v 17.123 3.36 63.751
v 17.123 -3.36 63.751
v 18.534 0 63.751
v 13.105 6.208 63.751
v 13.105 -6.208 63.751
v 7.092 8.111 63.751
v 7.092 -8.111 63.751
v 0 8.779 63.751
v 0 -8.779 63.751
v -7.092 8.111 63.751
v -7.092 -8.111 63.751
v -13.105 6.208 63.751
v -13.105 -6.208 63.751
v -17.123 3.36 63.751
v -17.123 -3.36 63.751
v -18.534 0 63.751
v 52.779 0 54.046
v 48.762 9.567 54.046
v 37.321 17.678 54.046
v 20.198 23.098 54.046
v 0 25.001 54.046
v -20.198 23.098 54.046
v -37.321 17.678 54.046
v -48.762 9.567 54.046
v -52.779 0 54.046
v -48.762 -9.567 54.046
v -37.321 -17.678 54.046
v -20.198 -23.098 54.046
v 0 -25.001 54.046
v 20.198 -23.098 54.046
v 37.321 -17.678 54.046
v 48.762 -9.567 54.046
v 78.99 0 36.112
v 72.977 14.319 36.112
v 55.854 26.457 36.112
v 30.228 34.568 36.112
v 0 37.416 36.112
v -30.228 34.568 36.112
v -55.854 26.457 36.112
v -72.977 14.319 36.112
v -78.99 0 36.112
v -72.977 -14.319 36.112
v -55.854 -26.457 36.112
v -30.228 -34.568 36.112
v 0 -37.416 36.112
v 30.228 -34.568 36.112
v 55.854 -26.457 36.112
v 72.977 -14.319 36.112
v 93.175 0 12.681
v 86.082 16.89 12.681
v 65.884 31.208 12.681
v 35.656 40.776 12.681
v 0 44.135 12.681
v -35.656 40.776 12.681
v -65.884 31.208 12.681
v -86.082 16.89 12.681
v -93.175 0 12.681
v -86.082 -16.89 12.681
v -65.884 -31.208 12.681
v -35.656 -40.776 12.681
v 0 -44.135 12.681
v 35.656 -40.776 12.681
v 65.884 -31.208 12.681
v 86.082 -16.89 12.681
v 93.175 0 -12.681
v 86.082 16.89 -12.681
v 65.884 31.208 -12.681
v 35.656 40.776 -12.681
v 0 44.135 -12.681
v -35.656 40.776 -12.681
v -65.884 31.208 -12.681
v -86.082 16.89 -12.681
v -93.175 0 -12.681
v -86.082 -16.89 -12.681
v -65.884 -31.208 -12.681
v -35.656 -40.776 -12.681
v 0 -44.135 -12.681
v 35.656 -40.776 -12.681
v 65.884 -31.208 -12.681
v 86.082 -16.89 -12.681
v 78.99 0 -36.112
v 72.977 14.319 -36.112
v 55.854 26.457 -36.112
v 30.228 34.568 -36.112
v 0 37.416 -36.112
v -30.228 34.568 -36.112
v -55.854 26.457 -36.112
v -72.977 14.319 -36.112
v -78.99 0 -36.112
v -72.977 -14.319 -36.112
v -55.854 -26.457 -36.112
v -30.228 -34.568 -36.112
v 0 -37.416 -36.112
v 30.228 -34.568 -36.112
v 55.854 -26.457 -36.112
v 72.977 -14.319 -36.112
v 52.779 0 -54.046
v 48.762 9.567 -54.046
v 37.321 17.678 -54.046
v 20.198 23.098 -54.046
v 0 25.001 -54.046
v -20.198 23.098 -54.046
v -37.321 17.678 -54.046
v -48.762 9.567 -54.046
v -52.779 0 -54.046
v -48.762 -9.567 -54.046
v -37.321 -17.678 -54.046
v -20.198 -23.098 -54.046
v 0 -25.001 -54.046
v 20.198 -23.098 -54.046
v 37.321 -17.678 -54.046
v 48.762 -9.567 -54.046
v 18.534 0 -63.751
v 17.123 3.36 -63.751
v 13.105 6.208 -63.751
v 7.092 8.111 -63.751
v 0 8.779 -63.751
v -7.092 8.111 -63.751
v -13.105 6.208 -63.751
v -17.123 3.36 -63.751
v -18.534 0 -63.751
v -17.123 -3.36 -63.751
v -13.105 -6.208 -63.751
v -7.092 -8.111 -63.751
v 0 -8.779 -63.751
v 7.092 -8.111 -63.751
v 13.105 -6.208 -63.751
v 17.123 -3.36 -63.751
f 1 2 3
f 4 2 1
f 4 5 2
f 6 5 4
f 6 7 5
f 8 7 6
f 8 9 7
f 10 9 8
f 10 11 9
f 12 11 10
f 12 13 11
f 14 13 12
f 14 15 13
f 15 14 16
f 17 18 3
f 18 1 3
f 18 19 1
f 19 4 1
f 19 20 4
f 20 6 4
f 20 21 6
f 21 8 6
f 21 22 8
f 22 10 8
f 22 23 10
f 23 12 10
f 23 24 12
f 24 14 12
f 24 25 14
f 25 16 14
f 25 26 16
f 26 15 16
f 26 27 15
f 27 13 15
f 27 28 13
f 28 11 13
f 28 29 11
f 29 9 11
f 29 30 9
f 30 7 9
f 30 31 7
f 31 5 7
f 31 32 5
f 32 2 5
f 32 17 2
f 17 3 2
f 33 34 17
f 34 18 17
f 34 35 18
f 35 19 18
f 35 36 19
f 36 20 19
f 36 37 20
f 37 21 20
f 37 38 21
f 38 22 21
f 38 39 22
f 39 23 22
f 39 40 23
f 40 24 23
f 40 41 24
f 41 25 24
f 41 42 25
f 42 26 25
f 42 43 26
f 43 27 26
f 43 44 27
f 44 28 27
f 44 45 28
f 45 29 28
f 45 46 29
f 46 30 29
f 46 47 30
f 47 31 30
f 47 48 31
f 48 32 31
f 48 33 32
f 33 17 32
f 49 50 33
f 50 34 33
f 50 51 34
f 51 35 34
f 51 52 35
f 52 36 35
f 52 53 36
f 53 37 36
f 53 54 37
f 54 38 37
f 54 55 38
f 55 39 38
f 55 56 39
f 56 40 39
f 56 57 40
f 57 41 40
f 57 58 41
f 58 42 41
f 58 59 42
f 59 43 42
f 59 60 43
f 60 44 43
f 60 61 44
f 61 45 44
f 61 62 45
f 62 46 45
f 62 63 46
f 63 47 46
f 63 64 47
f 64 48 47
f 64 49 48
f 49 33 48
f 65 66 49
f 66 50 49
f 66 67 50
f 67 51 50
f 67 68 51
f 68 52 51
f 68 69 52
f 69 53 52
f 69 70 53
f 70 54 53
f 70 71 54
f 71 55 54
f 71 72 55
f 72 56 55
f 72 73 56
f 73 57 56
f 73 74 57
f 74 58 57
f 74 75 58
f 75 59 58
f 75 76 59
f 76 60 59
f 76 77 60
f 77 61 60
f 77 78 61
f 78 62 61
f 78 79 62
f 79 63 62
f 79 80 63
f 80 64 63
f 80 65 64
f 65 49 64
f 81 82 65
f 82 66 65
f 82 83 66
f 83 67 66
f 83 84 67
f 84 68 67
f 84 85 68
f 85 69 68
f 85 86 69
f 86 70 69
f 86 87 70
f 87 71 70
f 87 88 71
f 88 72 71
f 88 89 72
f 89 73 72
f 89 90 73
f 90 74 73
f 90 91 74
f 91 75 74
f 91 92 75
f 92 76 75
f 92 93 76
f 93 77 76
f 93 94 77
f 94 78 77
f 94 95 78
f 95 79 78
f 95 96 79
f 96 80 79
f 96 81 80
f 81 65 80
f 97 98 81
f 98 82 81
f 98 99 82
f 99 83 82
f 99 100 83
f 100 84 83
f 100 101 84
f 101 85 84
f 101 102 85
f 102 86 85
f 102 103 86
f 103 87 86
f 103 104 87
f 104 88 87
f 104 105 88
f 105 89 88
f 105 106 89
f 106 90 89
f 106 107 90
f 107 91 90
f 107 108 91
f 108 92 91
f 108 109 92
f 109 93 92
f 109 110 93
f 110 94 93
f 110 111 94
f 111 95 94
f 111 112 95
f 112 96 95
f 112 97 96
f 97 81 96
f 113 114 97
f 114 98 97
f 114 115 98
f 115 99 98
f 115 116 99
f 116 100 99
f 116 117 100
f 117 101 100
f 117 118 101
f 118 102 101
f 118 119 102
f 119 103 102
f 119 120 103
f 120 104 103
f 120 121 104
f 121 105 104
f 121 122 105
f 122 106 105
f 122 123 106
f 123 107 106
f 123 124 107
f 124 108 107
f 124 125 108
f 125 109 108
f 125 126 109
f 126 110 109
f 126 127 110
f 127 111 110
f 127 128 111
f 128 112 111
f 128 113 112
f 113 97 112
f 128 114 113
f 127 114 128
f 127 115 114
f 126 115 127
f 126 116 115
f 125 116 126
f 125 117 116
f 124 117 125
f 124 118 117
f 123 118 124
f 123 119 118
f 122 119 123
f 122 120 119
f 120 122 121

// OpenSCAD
// Generated by SolidPython 1.0.1 on 2020-07-29 00:46:54


scale(v = [19, 9, 13]) {
	sphere(r = 5);
}
/***********************************************
*********      SolidPython code:      **********
************************************************
 
# import packages: SolidPython
from solid import *
from solid.utils import *
from itertools import chain, combinations, permutations


class Resize:

    def __init__(self, scad_file):
        self.scad_file = scad_file
        #self.scad_file = import_scad(scad_file)
        # cone/cylinder param:
        self.r1 = 0
        self.r2 = 0
        self.h = 0
        # rectangular prism param:
        self.w = 0
        self.l = 0
        # ellipse param:
        self.r = 0

    # import OpenScad code (file name corresponds to shape)


    # classify shape + parameters
    def assign(self, param1, param2, param3):
        if self.scad_file == 'cone.scad':
            self.r1 = param1
            self.r2 = param2
            self.h = param3
        elif self.scad_file == 'cylinder.scad':
            self.r1 = param1
            self.r2 = param2
            self.h = param3
        elif self.scad_file == 'rectangularPrism.scad':
            self.h = param1
            self.l = param2
            self.w = param3
        else:
            self.r = param1
            self.h = param2

    # resize parameters
    def iterate(self):
        x = range(3, 20, 2)
        i = 1
        if self.scad_file == 'cone.scad':
            tempList = list(permutations(x, 2))
            for temp in tempList:
                param1 = temp[0]
                param2 = temp[1]
                filepath = 'produced_scad_files/' + 'cone' + str(param1) + '_' + str(param2) + '_' + '.scad'
                scad_render_to_file(cylinder(h=param1, r1=param2, r2=0), filepath)

        elif self.scad_file == 'cylinder.scad':
            tempList = list(permutations(x, 3))
            for temp in tempList:
                param1 = temp[0]
                param2 = temp[1]
                filepath = 'produced_scad_files/' + 'cylinder' + str(param1) + '_' + str(param2) + '_' + '.scad'
                scad_render_to_file(cylinder(h=param1, r1=param2, r2=param2), filepath)

        elif self.scad_file == 'rectangularPrism.scad':
            tempList = list(permutations(x, 3))
            for temp in tempList:
                param1 = temp[0]
                param2 = temp[1]
                param3 = temp[2]
                filepath = 'produced_scad_files/' + 'rectangularPrism' + str(param1) + '_' + str(param2) + '_' + str(
                    param3) + '.scad'
                scad_render_to_file(cube(size=(param1, param2, param3)), filepath)

        elif self.scad_file == 'ellipse.scad':
            tempList = list(permutations(x, 4))
            for temp in tempList:
                param1 = temp[0]
                param2 = temp[1]
                param3 = temp[2]
                param4 = temp[3]
                filepath = 'produced_scad_files/' + 'ellipse' + str(param1) + '_' + str(param2) + '_' + str(param3) + '_' + str(param4) + '.scad'
                scad_render_to_file(scale([param1, param2, param3])(sphere(r=param4)), filepath)

    def render_to_scadfile(self):
        scad_render_to_file(scad, 'example.scad') 
 
************************************************/
